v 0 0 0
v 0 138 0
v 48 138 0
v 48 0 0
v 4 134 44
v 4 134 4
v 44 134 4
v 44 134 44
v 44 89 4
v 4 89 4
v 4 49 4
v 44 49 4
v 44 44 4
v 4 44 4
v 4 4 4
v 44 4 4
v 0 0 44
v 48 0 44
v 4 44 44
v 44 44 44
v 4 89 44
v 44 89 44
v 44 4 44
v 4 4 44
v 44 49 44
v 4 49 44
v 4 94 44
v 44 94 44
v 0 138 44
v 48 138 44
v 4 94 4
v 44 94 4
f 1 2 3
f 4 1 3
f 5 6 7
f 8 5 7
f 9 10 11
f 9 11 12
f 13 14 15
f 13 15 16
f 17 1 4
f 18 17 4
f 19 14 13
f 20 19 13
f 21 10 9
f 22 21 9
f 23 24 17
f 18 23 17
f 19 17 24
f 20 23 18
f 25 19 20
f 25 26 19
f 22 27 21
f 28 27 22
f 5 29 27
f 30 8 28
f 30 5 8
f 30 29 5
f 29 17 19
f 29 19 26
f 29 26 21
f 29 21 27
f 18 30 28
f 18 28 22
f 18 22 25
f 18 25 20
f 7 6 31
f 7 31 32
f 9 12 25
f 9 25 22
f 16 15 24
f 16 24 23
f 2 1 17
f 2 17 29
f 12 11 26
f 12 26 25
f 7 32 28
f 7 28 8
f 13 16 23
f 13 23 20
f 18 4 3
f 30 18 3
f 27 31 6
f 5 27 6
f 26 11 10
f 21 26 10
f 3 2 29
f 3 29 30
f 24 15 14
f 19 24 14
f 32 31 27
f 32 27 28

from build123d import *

# Parameters (mm, degrees)
CROQUIS1_W              = 48
CROQUIS1_H              = 138
SALIENTE_EXTRUIR1_DEPTH = 44
VACIADO1_T              = -4
CROQUIS2_W              = 40
CROQUIS2_H              = 5
SALIENTE_EXTRUIR2_DEPTH = 40


with BuildPart() as part:
    # Croquis1 → Saliente-Extruir1 (new body)
    with BuildSketch(Plane.XY):
        with Locations((24, 69)):
            Rectangle(CROQUIS1_W, CROQUIS1_H)
    extrude(amount=SALIENTE_EXTRUIR1_DEPTH)

    # Vaciado1
    vaciado1_openings = [part.faces().sort_by_distance(p)[0] for p in [
        (24, 69, 44),
    ]]
    offset(amount=VACIADO1_T, openings=vaciado1_openings, kind=Kind.INTERSECTION)

    # Croquis2 → Saliente-Extruir2 (add, through all)
    with BuildSketch(Plane.XY.offset(4)):
        with Locations((24, 46.5)):
            Rectangle(CROQUIS2_W, CROQUIS2_H)
        with Locations((24, 91.5)):
            Rectangle(CROQUIS2_W, CROQUIS2_H)
    extrude(amount=SALIENTE_EXTRUIR2_DEPTH)


solid = part.part
